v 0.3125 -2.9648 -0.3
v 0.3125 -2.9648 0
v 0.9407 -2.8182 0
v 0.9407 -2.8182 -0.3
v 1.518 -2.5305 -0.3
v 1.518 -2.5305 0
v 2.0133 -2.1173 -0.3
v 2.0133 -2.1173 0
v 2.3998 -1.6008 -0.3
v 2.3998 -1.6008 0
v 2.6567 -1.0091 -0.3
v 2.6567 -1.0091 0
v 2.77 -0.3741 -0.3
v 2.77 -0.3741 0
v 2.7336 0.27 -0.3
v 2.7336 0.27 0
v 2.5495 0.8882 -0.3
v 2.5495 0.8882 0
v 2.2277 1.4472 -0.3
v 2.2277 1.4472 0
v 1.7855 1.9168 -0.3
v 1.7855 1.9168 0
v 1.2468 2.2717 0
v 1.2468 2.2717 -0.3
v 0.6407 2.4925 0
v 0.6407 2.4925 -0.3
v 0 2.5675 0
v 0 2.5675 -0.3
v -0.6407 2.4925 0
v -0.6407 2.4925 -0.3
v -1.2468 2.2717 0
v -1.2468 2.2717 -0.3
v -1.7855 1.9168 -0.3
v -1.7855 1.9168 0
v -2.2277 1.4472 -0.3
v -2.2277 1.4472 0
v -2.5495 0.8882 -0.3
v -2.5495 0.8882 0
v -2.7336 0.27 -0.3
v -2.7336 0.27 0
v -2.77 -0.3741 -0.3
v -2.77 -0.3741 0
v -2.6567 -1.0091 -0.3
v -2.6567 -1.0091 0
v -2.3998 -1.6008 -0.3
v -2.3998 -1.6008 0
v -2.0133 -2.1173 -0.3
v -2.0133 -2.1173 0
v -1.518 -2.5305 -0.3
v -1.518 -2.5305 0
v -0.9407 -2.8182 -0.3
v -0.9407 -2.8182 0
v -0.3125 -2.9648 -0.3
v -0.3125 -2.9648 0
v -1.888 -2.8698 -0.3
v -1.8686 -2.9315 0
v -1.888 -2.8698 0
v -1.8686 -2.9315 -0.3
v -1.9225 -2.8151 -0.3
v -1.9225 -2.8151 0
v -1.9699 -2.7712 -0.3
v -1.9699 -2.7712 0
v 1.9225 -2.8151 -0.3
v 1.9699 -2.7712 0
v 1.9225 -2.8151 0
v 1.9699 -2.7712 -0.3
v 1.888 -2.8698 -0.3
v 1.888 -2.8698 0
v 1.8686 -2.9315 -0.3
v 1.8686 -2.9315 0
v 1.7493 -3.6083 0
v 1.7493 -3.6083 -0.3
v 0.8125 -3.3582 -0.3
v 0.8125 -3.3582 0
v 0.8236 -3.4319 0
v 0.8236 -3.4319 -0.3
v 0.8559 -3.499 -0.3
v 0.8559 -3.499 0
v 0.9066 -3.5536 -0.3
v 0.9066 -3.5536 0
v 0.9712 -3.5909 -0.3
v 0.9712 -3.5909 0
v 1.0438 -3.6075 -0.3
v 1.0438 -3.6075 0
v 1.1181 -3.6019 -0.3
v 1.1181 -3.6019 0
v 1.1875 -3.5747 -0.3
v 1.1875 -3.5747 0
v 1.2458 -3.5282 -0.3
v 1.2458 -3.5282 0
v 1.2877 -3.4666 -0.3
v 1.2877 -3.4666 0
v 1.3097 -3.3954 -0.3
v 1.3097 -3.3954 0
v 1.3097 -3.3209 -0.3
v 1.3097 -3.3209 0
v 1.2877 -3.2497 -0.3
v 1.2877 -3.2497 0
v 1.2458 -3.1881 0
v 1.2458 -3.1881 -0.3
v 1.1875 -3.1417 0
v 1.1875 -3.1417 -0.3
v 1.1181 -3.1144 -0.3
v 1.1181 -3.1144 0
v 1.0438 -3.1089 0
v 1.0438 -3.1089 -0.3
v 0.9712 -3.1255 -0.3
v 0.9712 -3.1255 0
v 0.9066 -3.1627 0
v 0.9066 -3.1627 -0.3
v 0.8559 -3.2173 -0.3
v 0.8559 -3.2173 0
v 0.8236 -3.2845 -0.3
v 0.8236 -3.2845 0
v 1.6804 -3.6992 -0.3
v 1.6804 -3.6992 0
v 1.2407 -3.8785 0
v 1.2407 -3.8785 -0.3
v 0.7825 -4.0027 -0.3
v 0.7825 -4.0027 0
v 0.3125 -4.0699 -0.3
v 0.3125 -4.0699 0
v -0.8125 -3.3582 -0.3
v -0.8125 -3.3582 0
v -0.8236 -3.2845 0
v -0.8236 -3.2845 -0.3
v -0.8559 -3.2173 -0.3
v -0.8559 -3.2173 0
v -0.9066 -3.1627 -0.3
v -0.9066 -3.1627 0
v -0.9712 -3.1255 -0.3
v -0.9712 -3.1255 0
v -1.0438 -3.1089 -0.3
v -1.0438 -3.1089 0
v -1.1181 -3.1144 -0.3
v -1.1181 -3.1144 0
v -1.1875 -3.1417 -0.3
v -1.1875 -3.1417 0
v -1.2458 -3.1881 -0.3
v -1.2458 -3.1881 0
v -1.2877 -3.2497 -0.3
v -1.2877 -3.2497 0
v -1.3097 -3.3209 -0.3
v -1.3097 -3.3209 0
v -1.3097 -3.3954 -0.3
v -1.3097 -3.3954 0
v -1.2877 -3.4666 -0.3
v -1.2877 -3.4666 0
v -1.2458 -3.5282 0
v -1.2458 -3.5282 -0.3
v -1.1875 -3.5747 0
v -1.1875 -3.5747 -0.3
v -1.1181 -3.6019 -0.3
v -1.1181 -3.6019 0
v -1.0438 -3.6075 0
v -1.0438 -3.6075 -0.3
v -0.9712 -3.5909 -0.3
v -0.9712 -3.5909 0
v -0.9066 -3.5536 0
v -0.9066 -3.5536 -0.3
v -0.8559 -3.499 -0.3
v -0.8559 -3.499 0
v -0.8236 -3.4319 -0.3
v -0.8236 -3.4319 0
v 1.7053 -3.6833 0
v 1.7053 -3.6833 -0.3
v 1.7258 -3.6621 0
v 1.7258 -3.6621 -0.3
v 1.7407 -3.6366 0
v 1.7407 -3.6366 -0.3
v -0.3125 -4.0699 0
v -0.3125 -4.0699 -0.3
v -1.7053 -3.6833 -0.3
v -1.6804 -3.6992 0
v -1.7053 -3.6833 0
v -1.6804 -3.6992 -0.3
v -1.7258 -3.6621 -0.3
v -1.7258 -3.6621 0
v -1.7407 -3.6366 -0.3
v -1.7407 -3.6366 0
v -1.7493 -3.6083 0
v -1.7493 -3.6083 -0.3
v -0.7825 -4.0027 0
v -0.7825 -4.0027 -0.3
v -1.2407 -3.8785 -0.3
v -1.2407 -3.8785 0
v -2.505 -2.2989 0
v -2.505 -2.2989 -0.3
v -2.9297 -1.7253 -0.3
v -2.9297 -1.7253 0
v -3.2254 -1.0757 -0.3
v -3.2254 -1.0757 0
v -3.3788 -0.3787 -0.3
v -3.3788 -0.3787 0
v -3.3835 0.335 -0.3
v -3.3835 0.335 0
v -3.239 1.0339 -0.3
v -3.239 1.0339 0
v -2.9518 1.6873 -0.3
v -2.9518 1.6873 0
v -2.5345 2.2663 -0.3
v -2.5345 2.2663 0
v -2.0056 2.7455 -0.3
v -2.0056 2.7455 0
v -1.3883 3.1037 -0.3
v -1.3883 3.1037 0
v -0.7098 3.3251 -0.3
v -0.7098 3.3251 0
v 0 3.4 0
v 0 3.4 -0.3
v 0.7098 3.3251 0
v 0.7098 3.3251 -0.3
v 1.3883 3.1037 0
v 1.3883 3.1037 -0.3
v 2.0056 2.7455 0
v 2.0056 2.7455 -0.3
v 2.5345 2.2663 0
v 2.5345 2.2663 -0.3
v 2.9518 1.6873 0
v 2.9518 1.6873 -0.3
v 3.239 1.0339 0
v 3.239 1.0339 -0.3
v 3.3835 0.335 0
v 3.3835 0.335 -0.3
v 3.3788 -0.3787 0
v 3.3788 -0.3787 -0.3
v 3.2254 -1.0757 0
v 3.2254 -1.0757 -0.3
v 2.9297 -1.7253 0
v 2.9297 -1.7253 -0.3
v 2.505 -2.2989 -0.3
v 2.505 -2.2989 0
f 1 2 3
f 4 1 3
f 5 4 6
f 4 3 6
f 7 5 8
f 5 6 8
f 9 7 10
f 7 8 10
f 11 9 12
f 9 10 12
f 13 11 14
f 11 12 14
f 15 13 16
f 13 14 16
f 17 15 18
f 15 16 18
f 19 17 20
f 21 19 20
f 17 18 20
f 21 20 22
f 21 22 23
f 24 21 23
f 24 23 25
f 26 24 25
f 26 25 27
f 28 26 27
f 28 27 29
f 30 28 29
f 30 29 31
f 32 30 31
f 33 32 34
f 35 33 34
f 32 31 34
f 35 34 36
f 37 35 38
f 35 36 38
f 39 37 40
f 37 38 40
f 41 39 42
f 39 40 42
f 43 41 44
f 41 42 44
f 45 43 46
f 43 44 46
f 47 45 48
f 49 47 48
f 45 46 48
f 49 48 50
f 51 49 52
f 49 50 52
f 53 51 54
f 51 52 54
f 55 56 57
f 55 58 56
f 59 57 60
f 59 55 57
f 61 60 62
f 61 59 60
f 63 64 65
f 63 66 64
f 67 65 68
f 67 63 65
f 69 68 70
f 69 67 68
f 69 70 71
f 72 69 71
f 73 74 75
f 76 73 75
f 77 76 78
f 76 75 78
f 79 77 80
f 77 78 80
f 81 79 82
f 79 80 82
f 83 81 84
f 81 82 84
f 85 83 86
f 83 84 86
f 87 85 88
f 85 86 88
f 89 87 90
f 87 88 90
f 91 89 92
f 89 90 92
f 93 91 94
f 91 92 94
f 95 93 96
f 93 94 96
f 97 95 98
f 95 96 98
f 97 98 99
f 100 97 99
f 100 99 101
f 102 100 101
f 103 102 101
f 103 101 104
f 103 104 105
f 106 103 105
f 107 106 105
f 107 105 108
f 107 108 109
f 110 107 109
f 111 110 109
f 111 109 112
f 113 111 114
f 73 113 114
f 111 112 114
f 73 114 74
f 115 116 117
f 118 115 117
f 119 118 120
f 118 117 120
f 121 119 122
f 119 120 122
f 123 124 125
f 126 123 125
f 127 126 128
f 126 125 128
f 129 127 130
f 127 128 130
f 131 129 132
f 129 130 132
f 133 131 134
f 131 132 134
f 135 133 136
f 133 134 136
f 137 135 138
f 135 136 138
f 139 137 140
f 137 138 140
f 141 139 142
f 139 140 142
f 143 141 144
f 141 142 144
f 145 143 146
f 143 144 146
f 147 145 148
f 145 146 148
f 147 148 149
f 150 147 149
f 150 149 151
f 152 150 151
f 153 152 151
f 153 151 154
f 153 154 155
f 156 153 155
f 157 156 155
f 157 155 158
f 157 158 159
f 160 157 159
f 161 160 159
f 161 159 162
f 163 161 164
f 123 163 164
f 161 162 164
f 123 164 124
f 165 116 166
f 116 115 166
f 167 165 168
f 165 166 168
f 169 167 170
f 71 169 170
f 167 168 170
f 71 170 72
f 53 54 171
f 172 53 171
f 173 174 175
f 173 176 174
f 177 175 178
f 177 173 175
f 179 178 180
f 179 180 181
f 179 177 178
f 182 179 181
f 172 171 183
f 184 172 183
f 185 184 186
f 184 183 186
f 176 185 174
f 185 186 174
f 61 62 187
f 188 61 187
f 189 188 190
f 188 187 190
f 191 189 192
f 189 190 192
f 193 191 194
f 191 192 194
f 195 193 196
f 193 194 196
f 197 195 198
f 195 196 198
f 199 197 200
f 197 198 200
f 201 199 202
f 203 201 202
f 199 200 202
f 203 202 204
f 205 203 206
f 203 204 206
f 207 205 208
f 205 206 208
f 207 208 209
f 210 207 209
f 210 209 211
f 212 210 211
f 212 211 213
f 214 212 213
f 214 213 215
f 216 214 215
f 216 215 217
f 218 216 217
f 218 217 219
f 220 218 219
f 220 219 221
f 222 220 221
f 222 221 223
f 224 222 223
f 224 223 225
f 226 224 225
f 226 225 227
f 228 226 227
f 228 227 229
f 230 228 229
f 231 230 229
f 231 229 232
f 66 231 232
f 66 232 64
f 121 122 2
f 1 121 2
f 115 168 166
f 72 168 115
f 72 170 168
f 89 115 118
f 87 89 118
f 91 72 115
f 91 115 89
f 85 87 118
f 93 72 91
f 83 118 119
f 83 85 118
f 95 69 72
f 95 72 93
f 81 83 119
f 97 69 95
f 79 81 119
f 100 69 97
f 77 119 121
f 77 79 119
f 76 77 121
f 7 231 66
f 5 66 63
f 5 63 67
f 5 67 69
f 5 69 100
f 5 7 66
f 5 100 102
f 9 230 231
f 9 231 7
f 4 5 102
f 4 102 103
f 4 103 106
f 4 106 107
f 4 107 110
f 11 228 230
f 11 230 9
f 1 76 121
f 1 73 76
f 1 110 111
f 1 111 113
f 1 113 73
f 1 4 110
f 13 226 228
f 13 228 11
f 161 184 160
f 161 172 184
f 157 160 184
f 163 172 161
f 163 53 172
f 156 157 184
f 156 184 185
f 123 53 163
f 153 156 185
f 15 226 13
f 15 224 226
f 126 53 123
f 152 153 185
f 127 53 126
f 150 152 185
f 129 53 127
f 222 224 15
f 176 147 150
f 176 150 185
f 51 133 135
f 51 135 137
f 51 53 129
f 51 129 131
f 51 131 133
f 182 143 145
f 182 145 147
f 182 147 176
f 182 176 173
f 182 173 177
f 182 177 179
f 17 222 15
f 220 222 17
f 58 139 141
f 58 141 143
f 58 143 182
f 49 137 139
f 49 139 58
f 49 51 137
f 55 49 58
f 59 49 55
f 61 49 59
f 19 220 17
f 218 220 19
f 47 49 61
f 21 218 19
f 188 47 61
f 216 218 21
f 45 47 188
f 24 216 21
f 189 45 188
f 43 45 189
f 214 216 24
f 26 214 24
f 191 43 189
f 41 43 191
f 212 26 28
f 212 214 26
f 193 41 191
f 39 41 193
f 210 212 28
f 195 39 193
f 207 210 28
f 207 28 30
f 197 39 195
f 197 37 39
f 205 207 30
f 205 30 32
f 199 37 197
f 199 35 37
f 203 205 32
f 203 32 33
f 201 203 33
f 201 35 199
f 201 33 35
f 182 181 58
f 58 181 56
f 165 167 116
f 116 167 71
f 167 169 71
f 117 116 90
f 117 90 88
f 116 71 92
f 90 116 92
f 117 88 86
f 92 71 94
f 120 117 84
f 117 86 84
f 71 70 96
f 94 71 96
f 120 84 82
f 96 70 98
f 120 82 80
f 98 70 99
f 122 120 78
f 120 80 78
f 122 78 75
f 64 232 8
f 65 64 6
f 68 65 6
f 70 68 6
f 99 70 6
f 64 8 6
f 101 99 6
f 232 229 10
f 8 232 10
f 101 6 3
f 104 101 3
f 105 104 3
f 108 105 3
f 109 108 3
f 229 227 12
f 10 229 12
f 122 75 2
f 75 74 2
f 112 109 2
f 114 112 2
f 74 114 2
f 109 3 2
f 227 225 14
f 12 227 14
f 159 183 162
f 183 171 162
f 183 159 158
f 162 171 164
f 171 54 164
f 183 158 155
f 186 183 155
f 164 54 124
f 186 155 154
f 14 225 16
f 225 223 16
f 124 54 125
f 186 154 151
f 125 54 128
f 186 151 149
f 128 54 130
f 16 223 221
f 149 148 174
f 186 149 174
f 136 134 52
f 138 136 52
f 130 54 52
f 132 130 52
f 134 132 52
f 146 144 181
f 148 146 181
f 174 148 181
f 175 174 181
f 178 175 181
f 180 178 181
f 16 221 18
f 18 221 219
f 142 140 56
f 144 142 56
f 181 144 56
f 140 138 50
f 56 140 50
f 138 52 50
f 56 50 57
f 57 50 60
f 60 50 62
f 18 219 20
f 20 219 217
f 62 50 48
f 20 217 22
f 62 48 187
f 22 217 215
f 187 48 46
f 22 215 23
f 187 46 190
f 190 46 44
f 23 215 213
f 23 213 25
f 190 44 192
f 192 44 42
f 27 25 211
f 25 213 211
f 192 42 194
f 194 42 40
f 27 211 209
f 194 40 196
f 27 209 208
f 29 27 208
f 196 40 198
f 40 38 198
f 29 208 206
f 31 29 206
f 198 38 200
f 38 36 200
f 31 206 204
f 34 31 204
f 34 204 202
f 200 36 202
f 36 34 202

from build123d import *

# Parameters (mm, degrees)
SKETCH1_R     = 1
BODY_DEPTH    = 1.2
FILLET1_R     = 0.5
FILLET2_R     = 1
SCALE_1_SCALE = 0.25


with BuildPart() as part:
    # Sketch1 → Body (new body)
    with BuildSketch(Plane.XY):
        with BuildLine():
            Line((-1.25, -11.859392549), (-1.25, -16.279514555))
            ThreePointArc((-1.25, -16.279514555), (-4.178435105, -15.756174328), (-6.952957407, -14.683027947))
            Line((-6.952957407, -14.683027947), (-7.547042593, -11.313803432))
            ThreePointArc((-7.547042593, -11.313803432), (0, 13.6), (7.547042593, -11.313803432))
            Line((7.547042593, -11.313803432), (6.952957407, -14.683027947))
            ThreePointArc((6.952957407, -14.683027947), (4.178435105, -15.756174328), (1.25, -16.279514555))
            Line((1.25, -16.279514555), (1.25, -11.859392549))
            ThreePointArc((1.25, -11.859392549), (0, 10.27), (-1.25, -11.859392549))
        make_face()
        with Locations(Location((4.25, -13.432678287, 0), (0, 0, 180))):
            Circle(SKETCH1_R, mode=Mode.SUBTRACT)
        with Locations((-4.25, -13.432678287)):
            Circle(SKETCH1_R, mode=Mode.SUBTRACT)
    extrude(amount=-BODY_DEPTH)

    # Fillet1
    fillet1_edges = [part.edges().sort_by_distance(p)[0] for p in [
        (-6.952957407, -14.683027947, -0.6),
        (6.952957407, -14.683027947, -0.6),
    ]]
    fillet(fillet1_edges, radius=FILLET1_R)

    # Fillet2
    fillet2_edges = [part.edges().sort_by_distance(p)[0] for p in [
        (-7.547042593, -11.313803432, -0.6),
        (7.547042593, -11.313803432, -0.6),
    ]]
    fillet(fillet2_edges, radius=FILLET2_R)


with BuildPart() as part_1:
    # 缩放比例1: scaled about (0, 0, 0)
    add(part.part.scale(SCALE_1_SCALE))


solid = part_1.part
